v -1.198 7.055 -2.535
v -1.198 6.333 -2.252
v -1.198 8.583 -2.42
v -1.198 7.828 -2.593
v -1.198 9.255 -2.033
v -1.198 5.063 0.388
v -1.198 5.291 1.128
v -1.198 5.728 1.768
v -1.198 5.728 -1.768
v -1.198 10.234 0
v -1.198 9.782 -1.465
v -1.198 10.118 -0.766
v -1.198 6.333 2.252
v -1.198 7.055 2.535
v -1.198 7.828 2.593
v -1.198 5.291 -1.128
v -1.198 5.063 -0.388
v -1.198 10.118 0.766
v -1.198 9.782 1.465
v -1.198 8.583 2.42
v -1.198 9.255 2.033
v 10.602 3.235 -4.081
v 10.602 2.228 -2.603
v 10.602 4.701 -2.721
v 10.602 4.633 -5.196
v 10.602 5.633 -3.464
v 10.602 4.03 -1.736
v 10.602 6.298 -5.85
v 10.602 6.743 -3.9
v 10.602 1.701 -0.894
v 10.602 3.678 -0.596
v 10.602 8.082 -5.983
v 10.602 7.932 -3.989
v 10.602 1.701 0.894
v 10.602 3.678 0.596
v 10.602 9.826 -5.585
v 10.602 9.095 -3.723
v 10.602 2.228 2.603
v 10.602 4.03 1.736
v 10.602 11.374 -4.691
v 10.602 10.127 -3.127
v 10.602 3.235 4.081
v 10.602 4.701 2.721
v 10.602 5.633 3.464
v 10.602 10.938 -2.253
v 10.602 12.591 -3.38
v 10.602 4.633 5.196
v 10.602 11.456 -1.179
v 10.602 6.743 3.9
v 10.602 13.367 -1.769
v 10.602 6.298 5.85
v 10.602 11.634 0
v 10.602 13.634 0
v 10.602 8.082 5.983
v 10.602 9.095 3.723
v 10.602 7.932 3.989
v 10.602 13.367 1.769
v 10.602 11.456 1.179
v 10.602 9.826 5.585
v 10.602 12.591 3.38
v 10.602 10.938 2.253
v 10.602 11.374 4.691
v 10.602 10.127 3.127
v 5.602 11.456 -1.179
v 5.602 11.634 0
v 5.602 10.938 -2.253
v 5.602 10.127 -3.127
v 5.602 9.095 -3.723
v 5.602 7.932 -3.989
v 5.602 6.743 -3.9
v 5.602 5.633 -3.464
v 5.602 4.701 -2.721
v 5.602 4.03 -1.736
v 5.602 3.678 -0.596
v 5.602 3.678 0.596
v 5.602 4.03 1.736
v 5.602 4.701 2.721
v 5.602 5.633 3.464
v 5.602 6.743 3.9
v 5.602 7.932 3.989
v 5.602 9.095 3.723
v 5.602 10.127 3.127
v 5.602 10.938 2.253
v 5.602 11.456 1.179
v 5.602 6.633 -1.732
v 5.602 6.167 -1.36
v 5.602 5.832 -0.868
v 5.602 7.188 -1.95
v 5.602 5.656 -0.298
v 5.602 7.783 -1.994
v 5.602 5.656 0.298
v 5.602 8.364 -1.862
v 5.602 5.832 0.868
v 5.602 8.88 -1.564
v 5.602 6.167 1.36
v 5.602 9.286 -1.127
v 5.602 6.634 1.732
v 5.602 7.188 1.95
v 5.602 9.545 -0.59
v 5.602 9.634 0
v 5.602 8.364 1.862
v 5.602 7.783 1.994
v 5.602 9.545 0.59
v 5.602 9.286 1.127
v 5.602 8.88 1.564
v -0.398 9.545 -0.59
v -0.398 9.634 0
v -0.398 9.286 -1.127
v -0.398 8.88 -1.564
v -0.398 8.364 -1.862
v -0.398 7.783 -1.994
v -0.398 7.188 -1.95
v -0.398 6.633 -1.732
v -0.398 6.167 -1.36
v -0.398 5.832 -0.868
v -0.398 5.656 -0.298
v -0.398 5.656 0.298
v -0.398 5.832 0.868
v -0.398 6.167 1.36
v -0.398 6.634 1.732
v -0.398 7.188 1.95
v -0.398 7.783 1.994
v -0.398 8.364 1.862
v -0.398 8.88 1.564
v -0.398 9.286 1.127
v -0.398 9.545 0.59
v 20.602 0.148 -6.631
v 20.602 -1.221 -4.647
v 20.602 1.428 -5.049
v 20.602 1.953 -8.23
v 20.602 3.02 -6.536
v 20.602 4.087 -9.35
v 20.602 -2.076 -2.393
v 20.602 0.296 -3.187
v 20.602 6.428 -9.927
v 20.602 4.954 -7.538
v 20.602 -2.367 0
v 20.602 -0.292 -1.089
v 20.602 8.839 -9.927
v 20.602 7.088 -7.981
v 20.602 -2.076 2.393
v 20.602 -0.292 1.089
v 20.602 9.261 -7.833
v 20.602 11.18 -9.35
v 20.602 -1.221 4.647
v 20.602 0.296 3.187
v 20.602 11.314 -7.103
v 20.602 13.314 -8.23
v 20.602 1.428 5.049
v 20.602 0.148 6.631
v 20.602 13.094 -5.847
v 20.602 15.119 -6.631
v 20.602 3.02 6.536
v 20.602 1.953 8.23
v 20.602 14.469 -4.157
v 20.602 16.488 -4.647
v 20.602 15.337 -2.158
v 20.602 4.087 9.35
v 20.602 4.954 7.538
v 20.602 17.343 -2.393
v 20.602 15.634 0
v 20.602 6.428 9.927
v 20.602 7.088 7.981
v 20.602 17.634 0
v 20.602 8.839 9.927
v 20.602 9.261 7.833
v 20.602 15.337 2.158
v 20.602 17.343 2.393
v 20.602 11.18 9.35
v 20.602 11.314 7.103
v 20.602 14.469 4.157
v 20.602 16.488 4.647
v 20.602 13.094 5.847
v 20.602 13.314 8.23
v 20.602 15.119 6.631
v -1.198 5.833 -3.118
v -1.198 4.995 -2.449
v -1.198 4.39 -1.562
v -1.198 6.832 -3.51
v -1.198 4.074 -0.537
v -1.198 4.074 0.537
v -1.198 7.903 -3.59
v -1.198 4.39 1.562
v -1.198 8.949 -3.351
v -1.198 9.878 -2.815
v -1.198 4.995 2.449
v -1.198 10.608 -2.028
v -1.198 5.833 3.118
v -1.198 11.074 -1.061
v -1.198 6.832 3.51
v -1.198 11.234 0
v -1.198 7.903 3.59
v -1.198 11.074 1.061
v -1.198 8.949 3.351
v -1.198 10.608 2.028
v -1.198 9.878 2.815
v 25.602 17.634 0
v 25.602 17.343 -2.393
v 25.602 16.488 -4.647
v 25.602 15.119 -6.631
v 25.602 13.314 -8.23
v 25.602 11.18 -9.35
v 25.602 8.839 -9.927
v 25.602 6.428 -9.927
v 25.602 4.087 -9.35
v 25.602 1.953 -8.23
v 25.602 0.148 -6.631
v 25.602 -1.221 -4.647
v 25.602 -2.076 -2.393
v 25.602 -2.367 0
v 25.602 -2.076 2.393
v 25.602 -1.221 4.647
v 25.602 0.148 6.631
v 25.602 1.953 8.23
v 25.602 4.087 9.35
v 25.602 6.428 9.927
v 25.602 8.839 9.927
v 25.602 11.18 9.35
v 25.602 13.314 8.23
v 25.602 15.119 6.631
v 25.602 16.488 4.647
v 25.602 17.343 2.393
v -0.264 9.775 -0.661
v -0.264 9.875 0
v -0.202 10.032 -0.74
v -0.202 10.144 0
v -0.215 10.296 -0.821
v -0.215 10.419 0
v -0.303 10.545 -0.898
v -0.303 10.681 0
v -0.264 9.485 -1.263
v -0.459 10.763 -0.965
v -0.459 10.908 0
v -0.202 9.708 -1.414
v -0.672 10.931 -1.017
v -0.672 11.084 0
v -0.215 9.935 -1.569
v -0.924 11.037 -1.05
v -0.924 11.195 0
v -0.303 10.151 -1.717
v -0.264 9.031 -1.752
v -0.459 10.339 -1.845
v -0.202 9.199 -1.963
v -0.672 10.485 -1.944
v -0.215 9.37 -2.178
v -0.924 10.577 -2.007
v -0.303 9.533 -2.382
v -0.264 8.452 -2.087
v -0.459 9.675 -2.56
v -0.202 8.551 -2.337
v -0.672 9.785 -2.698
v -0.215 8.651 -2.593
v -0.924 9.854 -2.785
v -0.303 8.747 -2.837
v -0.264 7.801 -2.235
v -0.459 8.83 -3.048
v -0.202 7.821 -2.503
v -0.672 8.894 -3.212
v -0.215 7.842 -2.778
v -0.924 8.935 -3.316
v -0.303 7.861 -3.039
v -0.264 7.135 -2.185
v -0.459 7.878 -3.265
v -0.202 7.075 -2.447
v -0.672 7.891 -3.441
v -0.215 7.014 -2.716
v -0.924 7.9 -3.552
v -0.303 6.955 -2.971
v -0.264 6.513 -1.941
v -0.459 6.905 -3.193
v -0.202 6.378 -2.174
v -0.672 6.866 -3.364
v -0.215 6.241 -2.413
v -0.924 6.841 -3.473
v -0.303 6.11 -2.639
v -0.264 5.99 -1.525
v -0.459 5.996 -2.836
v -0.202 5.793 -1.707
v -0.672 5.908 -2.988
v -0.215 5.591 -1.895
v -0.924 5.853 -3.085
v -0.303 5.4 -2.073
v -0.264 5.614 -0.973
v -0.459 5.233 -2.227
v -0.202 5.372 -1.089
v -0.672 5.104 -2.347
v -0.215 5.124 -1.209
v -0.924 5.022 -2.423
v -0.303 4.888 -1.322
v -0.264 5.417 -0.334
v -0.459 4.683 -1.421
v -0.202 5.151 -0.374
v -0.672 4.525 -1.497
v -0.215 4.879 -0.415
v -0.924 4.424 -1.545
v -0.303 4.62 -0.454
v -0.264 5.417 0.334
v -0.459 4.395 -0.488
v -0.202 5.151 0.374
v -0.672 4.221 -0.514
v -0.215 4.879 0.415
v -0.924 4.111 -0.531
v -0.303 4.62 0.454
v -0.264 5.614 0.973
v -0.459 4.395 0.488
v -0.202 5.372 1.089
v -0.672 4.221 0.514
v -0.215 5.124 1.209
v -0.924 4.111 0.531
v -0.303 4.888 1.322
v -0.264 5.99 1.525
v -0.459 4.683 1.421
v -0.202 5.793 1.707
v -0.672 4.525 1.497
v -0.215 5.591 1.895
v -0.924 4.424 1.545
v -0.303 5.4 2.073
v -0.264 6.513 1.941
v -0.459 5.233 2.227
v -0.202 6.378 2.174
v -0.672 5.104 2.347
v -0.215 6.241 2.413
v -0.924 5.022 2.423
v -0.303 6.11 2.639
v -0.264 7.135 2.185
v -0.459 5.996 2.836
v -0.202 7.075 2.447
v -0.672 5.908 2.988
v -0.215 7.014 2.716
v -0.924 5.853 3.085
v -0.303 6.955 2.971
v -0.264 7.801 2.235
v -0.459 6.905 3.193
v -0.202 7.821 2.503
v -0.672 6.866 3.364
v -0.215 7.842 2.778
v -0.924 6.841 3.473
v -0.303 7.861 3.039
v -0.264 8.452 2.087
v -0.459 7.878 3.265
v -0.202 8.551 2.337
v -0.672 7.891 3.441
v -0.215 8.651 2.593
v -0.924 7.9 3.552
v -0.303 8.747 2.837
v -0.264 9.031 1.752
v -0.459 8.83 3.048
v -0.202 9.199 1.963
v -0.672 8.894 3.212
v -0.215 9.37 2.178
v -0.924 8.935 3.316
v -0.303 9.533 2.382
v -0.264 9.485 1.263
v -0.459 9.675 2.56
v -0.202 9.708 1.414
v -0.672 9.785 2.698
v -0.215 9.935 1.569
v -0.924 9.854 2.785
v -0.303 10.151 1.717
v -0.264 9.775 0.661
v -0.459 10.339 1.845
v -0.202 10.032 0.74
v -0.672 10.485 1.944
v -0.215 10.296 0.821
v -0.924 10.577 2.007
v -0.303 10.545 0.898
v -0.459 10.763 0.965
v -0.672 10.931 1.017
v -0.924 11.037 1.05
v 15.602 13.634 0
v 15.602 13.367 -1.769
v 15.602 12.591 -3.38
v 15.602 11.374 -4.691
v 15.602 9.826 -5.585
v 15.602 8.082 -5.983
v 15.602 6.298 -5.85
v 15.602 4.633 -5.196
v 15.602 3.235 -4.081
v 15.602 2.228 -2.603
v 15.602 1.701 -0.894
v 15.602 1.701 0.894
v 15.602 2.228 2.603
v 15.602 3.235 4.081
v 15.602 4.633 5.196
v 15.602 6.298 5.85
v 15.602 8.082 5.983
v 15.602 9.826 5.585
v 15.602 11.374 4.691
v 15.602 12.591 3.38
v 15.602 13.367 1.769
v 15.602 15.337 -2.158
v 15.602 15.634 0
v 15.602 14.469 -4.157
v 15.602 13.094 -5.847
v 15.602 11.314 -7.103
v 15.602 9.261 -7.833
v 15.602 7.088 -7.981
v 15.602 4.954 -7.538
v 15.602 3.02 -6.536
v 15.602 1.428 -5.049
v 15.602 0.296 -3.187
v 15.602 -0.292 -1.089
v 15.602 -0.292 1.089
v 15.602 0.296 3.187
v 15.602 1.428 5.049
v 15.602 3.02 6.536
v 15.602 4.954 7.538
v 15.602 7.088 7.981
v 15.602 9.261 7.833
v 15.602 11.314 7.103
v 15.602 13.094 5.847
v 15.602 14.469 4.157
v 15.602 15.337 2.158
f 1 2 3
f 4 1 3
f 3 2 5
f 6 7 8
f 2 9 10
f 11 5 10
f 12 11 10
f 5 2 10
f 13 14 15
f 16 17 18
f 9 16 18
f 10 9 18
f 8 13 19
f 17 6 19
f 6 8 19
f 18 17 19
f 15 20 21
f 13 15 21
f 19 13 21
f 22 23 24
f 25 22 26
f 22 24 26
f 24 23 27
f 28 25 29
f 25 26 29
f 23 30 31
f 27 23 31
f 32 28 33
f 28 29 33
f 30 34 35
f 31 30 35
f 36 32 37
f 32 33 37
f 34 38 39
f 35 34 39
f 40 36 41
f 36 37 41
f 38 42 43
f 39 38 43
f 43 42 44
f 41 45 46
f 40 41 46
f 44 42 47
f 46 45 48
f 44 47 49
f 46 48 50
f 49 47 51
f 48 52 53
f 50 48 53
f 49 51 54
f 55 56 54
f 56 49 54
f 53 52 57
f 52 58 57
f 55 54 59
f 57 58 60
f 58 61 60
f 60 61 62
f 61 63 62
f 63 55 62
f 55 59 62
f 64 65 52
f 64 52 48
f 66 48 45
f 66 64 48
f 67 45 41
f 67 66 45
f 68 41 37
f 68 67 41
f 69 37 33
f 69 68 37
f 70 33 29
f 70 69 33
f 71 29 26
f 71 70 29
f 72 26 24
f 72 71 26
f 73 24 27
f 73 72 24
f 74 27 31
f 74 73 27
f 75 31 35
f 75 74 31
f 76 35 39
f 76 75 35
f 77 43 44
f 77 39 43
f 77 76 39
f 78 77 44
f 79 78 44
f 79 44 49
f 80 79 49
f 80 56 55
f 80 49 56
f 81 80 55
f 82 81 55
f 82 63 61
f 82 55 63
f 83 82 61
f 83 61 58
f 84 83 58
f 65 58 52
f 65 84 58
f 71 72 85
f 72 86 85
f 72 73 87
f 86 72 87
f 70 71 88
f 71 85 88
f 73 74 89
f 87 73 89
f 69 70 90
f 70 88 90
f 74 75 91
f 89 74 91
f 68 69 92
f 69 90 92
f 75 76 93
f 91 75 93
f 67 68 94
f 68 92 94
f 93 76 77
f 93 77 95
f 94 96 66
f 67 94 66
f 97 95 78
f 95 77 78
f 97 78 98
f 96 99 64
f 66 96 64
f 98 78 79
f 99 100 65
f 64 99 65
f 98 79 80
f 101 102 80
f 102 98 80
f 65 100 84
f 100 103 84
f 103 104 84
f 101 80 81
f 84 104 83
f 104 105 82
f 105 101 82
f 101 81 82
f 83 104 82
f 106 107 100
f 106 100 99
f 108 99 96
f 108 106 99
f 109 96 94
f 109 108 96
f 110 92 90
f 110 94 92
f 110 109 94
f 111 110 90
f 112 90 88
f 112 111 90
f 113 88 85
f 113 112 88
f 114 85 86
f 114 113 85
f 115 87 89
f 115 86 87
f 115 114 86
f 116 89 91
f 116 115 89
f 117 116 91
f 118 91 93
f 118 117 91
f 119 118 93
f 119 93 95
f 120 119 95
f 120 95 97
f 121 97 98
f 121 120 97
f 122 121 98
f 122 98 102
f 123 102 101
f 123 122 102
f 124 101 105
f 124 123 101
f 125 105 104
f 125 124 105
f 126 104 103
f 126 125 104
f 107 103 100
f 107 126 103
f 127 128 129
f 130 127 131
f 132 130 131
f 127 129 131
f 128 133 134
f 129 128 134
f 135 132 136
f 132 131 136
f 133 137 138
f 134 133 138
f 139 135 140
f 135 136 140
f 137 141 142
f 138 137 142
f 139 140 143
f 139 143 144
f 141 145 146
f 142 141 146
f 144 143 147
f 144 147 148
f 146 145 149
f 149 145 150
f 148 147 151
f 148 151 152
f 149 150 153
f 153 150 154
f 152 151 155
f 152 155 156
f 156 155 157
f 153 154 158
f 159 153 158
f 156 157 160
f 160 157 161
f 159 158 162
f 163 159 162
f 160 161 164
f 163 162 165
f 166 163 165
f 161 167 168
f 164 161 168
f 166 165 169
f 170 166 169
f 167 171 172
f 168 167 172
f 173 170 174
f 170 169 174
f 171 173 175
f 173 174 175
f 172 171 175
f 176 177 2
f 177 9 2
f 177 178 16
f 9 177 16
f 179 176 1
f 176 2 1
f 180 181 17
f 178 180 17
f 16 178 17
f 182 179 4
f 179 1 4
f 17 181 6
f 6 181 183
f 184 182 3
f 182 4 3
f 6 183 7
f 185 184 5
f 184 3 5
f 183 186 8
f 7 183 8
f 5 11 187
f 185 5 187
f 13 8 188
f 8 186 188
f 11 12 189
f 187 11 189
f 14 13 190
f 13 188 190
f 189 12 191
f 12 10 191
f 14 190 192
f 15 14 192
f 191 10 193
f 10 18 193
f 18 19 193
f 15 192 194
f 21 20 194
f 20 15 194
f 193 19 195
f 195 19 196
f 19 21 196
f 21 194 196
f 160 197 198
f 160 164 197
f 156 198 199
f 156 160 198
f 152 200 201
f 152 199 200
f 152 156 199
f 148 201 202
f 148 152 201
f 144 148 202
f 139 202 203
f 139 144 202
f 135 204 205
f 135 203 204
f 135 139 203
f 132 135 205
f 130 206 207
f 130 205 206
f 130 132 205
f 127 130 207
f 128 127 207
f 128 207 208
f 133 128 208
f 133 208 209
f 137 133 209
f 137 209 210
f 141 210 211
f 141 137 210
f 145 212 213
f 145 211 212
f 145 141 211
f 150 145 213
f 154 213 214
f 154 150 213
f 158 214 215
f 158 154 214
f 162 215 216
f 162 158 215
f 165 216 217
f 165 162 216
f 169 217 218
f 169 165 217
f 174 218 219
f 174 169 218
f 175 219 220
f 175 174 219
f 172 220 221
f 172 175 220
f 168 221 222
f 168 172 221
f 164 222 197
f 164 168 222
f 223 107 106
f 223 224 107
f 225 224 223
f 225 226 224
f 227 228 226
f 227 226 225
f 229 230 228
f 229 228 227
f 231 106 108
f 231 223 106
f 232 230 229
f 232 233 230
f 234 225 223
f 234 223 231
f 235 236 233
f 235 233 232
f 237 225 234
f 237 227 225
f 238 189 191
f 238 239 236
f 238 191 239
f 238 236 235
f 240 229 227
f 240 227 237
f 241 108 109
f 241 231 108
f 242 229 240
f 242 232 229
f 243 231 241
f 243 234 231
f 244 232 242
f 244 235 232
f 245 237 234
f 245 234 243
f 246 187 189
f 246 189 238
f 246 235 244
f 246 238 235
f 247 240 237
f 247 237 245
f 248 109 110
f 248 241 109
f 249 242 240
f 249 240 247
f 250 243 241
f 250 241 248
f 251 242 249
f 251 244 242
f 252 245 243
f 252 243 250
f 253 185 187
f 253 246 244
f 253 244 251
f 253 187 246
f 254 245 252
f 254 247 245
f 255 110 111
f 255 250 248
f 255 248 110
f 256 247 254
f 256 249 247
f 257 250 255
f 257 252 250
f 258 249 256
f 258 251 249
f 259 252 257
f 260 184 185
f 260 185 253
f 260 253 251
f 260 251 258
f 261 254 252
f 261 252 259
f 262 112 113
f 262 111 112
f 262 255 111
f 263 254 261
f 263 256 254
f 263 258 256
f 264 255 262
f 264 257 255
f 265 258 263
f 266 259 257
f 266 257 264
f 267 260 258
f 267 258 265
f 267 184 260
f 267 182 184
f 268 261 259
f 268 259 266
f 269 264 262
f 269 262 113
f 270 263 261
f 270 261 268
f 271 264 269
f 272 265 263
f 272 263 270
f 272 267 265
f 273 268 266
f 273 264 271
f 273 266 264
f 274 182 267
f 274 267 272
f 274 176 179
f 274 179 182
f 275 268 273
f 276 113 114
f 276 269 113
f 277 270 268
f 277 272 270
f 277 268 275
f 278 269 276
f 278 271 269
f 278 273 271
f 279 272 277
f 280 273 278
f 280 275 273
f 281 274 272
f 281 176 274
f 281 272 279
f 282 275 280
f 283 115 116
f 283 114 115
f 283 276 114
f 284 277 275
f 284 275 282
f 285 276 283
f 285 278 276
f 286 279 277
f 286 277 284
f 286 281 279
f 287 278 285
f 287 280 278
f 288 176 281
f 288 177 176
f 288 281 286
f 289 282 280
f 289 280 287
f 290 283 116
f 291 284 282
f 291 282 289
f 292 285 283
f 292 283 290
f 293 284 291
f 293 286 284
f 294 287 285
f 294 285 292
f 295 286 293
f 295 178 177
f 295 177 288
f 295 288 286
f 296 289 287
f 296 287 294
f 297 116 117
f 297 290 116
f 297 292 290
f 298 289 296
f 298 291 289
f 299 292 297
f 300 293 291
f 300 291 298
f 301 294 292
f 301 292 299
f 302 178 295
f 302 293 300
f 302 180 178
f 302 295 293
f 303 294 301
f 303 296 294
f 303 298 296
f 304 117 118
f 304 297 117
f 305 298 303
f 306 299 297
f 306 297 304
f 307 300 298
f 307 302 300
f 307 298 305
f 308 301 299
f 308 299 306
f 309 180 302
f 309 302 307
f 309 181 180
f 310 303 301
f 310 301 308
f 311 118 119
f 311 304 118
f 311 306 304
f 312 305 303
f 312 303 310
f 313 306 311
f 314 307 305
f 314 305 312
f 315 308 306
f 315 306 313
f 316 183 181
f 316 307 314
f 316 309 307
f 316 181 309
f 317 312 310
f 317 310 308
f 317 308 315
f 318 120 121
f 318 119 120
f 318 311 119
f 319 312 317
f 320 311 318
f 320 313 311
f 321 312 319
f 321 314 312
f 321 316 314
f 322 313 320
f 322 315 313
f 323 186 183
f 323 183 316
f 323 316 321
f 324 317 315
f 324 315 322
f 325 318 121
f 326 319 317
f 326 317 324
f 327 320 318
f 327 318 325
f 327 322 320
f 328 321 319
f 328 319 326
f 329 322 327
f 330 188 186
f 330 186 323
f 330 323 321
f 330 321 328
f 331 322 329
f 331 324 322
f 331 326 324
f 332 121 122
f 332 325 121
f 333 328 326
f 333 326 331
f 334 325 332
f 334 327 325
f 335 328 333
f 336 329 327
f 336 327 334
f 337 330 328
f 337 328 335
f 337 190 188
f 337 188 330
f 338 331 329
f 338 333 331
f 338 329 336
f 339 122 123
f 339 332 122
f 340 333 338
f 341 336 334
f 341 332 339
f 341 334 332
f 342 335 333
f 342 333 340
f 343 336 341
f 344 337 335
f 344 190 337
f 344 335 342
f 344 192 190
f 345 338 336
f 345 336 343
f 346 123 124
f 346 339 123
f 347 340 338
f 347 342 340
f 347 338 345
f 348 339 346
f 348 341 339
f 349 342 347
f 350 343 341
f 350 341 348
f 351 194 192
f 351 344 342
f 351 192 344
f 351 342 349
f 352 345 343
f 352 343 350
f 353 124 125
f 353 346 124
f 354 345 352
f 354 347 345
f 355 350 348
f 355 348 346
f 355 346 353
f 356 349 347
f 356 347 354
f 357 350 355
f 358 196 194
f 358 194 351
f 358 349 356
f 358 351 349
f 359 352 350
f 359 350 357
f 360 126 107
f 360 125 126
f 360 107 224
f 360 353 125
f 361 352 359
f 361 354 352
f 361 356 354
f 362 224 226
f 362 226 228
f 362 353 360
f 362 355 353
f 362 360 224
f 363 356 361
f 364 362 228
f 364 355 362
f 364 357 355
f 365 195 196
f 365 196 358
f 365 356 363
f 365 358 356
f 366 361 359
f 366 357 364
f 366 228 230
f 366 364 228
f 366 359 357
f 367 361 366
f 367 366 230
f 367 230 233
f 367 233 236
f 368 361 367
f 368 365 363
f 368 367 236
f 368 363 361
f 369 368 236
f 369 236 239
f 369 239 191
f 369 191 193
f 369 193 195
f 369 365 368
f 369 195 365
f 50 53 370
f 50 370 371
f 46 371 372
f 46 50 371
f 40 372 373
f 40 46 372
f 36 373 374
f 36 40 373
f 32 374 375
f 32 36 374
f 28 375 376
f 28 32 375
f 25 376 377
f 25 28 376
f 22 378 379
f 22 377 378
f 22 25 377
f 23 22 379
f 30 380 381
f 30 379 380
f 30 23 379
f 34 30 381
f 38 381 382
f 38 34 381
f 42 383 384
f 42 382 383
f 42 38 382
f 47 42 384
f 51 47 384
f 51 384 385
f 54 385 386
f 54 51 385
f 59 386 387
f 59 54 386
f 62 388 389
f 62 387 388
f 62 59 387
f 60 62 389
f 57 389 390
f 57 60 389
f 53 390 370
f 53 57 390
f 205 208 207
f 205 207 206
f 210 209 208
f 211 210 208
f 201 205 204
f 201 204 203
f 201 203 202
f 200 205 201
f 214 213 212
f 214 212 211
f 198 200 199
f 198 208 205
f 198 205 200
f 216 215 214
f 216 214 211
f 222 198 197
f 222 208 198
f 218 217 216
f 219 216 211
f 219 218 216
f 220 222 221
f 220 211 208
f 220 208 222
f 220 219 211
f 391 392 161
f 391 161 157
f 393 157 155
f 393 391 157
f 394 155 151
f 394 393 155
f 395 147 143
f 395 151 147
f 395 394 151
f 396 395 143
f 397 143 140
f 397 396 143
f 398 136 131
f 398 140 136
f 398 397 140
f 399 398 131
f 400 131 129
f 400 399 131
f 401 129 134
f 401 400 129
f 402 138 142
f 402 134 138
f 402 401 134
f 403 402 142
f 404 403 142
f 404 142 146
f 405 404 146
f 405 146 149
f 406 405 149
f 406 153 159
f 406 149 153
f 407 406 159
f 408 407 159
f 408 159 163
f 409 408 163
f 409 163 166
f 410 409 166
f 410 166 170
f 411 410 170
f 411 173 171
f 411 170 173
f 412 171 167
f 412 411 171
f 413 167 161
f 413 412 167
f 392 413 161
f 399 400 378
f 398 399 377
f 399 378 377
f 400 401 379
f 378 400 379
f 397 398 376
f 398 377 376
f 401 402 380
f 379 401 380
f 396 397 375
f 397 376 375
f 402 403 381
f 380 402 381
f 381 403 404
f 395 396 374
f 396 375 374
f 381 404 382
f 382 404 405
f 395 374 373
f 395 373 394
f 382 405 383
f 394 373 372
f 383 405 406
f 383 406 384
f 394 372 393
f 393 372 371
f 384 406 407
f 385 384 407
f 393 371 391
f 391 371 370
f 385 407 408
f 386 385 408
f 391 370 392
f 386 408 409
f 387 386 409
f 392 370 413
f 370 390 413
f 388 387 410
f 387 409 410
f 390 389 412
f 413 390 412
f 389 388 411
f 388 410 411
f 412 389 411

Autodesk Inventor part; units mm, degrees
ref_plane "YZ Plane" through (0, 0, 0) normal (1, 0, 0) x (0, 1, 0)
ref_plane "XZ Plane" through (0, 0, 0) normal (0, 1, 0) x (-1, 0, 0)
ref_plane "XY Plane" through (0, 0, 0) normal (0, 0, 1) x (1, 0, 0)
sketch "Sketch1" plane through (0, 0, 0) normal (0, 0, 1) x (1, 0, 0)
  line L0 (-42.6611, 7.6335) -> (42.1293, 7.6335) construction
  line L1 (25.6024, 7.6335) -> (25.6024, 17.6335)
  line L2 (25.6024, 17.6335) -> (20.6024, 17.6335)
  line L3 (20.6024, 17.6335) -> (20.6024, 15.6335)
  line L4 (20.6024, 15.6335) -> (15.6024, 15.6335)
  line L5 (15.6024, 15.6335) -> (15.6024, 13.6335)
  line L6 (15.6024, 13.6335) -> (10.6024, 13.6335)
  line L7 (10.6024, 13.6335) -> (10.6024, 11.6335)
  line L8 (10.6024, 11.6335) -> (5.6024, 11.6335)
  line L9 (5.6024, 11.6335) -> (5.6024, 9.6335)
  line L10 (5.6024, 9.6335) -> (-0.3976, 9.6335)
  arc A0 (-0.3976, 9.6335) -> (-1.1976, 11.2335) centre (-1.1976, 10.2335) ccw
  line L11 (-1.1976, 10.2335) -> (-1.1976, 7.6335)
  line L12 (-1.1976, 10.2335) -> (-1.1976, 11.2335)
  line L13 (-1.1976, 7.6335) -> (25.6024, 7.6335)
  point P0 (0, 0)
  dimension "d2" = 5
  dimension "d3" = 5
  dimension "d4" = 5
  dimension "d5" = 5
  dimension "d7" = 2
  dimension "d8" = 2
  dimension "d9" = 2
  dimension "d10" = 2
  dimension "d11" = 2
  dimension "d12" = 2
revolve "Revolution1" add sketch "Sketch1" angle 360 about axis through (-42.6611, 7.6335, 0) along (1, 0, 0)
properties part number "lesson4"
